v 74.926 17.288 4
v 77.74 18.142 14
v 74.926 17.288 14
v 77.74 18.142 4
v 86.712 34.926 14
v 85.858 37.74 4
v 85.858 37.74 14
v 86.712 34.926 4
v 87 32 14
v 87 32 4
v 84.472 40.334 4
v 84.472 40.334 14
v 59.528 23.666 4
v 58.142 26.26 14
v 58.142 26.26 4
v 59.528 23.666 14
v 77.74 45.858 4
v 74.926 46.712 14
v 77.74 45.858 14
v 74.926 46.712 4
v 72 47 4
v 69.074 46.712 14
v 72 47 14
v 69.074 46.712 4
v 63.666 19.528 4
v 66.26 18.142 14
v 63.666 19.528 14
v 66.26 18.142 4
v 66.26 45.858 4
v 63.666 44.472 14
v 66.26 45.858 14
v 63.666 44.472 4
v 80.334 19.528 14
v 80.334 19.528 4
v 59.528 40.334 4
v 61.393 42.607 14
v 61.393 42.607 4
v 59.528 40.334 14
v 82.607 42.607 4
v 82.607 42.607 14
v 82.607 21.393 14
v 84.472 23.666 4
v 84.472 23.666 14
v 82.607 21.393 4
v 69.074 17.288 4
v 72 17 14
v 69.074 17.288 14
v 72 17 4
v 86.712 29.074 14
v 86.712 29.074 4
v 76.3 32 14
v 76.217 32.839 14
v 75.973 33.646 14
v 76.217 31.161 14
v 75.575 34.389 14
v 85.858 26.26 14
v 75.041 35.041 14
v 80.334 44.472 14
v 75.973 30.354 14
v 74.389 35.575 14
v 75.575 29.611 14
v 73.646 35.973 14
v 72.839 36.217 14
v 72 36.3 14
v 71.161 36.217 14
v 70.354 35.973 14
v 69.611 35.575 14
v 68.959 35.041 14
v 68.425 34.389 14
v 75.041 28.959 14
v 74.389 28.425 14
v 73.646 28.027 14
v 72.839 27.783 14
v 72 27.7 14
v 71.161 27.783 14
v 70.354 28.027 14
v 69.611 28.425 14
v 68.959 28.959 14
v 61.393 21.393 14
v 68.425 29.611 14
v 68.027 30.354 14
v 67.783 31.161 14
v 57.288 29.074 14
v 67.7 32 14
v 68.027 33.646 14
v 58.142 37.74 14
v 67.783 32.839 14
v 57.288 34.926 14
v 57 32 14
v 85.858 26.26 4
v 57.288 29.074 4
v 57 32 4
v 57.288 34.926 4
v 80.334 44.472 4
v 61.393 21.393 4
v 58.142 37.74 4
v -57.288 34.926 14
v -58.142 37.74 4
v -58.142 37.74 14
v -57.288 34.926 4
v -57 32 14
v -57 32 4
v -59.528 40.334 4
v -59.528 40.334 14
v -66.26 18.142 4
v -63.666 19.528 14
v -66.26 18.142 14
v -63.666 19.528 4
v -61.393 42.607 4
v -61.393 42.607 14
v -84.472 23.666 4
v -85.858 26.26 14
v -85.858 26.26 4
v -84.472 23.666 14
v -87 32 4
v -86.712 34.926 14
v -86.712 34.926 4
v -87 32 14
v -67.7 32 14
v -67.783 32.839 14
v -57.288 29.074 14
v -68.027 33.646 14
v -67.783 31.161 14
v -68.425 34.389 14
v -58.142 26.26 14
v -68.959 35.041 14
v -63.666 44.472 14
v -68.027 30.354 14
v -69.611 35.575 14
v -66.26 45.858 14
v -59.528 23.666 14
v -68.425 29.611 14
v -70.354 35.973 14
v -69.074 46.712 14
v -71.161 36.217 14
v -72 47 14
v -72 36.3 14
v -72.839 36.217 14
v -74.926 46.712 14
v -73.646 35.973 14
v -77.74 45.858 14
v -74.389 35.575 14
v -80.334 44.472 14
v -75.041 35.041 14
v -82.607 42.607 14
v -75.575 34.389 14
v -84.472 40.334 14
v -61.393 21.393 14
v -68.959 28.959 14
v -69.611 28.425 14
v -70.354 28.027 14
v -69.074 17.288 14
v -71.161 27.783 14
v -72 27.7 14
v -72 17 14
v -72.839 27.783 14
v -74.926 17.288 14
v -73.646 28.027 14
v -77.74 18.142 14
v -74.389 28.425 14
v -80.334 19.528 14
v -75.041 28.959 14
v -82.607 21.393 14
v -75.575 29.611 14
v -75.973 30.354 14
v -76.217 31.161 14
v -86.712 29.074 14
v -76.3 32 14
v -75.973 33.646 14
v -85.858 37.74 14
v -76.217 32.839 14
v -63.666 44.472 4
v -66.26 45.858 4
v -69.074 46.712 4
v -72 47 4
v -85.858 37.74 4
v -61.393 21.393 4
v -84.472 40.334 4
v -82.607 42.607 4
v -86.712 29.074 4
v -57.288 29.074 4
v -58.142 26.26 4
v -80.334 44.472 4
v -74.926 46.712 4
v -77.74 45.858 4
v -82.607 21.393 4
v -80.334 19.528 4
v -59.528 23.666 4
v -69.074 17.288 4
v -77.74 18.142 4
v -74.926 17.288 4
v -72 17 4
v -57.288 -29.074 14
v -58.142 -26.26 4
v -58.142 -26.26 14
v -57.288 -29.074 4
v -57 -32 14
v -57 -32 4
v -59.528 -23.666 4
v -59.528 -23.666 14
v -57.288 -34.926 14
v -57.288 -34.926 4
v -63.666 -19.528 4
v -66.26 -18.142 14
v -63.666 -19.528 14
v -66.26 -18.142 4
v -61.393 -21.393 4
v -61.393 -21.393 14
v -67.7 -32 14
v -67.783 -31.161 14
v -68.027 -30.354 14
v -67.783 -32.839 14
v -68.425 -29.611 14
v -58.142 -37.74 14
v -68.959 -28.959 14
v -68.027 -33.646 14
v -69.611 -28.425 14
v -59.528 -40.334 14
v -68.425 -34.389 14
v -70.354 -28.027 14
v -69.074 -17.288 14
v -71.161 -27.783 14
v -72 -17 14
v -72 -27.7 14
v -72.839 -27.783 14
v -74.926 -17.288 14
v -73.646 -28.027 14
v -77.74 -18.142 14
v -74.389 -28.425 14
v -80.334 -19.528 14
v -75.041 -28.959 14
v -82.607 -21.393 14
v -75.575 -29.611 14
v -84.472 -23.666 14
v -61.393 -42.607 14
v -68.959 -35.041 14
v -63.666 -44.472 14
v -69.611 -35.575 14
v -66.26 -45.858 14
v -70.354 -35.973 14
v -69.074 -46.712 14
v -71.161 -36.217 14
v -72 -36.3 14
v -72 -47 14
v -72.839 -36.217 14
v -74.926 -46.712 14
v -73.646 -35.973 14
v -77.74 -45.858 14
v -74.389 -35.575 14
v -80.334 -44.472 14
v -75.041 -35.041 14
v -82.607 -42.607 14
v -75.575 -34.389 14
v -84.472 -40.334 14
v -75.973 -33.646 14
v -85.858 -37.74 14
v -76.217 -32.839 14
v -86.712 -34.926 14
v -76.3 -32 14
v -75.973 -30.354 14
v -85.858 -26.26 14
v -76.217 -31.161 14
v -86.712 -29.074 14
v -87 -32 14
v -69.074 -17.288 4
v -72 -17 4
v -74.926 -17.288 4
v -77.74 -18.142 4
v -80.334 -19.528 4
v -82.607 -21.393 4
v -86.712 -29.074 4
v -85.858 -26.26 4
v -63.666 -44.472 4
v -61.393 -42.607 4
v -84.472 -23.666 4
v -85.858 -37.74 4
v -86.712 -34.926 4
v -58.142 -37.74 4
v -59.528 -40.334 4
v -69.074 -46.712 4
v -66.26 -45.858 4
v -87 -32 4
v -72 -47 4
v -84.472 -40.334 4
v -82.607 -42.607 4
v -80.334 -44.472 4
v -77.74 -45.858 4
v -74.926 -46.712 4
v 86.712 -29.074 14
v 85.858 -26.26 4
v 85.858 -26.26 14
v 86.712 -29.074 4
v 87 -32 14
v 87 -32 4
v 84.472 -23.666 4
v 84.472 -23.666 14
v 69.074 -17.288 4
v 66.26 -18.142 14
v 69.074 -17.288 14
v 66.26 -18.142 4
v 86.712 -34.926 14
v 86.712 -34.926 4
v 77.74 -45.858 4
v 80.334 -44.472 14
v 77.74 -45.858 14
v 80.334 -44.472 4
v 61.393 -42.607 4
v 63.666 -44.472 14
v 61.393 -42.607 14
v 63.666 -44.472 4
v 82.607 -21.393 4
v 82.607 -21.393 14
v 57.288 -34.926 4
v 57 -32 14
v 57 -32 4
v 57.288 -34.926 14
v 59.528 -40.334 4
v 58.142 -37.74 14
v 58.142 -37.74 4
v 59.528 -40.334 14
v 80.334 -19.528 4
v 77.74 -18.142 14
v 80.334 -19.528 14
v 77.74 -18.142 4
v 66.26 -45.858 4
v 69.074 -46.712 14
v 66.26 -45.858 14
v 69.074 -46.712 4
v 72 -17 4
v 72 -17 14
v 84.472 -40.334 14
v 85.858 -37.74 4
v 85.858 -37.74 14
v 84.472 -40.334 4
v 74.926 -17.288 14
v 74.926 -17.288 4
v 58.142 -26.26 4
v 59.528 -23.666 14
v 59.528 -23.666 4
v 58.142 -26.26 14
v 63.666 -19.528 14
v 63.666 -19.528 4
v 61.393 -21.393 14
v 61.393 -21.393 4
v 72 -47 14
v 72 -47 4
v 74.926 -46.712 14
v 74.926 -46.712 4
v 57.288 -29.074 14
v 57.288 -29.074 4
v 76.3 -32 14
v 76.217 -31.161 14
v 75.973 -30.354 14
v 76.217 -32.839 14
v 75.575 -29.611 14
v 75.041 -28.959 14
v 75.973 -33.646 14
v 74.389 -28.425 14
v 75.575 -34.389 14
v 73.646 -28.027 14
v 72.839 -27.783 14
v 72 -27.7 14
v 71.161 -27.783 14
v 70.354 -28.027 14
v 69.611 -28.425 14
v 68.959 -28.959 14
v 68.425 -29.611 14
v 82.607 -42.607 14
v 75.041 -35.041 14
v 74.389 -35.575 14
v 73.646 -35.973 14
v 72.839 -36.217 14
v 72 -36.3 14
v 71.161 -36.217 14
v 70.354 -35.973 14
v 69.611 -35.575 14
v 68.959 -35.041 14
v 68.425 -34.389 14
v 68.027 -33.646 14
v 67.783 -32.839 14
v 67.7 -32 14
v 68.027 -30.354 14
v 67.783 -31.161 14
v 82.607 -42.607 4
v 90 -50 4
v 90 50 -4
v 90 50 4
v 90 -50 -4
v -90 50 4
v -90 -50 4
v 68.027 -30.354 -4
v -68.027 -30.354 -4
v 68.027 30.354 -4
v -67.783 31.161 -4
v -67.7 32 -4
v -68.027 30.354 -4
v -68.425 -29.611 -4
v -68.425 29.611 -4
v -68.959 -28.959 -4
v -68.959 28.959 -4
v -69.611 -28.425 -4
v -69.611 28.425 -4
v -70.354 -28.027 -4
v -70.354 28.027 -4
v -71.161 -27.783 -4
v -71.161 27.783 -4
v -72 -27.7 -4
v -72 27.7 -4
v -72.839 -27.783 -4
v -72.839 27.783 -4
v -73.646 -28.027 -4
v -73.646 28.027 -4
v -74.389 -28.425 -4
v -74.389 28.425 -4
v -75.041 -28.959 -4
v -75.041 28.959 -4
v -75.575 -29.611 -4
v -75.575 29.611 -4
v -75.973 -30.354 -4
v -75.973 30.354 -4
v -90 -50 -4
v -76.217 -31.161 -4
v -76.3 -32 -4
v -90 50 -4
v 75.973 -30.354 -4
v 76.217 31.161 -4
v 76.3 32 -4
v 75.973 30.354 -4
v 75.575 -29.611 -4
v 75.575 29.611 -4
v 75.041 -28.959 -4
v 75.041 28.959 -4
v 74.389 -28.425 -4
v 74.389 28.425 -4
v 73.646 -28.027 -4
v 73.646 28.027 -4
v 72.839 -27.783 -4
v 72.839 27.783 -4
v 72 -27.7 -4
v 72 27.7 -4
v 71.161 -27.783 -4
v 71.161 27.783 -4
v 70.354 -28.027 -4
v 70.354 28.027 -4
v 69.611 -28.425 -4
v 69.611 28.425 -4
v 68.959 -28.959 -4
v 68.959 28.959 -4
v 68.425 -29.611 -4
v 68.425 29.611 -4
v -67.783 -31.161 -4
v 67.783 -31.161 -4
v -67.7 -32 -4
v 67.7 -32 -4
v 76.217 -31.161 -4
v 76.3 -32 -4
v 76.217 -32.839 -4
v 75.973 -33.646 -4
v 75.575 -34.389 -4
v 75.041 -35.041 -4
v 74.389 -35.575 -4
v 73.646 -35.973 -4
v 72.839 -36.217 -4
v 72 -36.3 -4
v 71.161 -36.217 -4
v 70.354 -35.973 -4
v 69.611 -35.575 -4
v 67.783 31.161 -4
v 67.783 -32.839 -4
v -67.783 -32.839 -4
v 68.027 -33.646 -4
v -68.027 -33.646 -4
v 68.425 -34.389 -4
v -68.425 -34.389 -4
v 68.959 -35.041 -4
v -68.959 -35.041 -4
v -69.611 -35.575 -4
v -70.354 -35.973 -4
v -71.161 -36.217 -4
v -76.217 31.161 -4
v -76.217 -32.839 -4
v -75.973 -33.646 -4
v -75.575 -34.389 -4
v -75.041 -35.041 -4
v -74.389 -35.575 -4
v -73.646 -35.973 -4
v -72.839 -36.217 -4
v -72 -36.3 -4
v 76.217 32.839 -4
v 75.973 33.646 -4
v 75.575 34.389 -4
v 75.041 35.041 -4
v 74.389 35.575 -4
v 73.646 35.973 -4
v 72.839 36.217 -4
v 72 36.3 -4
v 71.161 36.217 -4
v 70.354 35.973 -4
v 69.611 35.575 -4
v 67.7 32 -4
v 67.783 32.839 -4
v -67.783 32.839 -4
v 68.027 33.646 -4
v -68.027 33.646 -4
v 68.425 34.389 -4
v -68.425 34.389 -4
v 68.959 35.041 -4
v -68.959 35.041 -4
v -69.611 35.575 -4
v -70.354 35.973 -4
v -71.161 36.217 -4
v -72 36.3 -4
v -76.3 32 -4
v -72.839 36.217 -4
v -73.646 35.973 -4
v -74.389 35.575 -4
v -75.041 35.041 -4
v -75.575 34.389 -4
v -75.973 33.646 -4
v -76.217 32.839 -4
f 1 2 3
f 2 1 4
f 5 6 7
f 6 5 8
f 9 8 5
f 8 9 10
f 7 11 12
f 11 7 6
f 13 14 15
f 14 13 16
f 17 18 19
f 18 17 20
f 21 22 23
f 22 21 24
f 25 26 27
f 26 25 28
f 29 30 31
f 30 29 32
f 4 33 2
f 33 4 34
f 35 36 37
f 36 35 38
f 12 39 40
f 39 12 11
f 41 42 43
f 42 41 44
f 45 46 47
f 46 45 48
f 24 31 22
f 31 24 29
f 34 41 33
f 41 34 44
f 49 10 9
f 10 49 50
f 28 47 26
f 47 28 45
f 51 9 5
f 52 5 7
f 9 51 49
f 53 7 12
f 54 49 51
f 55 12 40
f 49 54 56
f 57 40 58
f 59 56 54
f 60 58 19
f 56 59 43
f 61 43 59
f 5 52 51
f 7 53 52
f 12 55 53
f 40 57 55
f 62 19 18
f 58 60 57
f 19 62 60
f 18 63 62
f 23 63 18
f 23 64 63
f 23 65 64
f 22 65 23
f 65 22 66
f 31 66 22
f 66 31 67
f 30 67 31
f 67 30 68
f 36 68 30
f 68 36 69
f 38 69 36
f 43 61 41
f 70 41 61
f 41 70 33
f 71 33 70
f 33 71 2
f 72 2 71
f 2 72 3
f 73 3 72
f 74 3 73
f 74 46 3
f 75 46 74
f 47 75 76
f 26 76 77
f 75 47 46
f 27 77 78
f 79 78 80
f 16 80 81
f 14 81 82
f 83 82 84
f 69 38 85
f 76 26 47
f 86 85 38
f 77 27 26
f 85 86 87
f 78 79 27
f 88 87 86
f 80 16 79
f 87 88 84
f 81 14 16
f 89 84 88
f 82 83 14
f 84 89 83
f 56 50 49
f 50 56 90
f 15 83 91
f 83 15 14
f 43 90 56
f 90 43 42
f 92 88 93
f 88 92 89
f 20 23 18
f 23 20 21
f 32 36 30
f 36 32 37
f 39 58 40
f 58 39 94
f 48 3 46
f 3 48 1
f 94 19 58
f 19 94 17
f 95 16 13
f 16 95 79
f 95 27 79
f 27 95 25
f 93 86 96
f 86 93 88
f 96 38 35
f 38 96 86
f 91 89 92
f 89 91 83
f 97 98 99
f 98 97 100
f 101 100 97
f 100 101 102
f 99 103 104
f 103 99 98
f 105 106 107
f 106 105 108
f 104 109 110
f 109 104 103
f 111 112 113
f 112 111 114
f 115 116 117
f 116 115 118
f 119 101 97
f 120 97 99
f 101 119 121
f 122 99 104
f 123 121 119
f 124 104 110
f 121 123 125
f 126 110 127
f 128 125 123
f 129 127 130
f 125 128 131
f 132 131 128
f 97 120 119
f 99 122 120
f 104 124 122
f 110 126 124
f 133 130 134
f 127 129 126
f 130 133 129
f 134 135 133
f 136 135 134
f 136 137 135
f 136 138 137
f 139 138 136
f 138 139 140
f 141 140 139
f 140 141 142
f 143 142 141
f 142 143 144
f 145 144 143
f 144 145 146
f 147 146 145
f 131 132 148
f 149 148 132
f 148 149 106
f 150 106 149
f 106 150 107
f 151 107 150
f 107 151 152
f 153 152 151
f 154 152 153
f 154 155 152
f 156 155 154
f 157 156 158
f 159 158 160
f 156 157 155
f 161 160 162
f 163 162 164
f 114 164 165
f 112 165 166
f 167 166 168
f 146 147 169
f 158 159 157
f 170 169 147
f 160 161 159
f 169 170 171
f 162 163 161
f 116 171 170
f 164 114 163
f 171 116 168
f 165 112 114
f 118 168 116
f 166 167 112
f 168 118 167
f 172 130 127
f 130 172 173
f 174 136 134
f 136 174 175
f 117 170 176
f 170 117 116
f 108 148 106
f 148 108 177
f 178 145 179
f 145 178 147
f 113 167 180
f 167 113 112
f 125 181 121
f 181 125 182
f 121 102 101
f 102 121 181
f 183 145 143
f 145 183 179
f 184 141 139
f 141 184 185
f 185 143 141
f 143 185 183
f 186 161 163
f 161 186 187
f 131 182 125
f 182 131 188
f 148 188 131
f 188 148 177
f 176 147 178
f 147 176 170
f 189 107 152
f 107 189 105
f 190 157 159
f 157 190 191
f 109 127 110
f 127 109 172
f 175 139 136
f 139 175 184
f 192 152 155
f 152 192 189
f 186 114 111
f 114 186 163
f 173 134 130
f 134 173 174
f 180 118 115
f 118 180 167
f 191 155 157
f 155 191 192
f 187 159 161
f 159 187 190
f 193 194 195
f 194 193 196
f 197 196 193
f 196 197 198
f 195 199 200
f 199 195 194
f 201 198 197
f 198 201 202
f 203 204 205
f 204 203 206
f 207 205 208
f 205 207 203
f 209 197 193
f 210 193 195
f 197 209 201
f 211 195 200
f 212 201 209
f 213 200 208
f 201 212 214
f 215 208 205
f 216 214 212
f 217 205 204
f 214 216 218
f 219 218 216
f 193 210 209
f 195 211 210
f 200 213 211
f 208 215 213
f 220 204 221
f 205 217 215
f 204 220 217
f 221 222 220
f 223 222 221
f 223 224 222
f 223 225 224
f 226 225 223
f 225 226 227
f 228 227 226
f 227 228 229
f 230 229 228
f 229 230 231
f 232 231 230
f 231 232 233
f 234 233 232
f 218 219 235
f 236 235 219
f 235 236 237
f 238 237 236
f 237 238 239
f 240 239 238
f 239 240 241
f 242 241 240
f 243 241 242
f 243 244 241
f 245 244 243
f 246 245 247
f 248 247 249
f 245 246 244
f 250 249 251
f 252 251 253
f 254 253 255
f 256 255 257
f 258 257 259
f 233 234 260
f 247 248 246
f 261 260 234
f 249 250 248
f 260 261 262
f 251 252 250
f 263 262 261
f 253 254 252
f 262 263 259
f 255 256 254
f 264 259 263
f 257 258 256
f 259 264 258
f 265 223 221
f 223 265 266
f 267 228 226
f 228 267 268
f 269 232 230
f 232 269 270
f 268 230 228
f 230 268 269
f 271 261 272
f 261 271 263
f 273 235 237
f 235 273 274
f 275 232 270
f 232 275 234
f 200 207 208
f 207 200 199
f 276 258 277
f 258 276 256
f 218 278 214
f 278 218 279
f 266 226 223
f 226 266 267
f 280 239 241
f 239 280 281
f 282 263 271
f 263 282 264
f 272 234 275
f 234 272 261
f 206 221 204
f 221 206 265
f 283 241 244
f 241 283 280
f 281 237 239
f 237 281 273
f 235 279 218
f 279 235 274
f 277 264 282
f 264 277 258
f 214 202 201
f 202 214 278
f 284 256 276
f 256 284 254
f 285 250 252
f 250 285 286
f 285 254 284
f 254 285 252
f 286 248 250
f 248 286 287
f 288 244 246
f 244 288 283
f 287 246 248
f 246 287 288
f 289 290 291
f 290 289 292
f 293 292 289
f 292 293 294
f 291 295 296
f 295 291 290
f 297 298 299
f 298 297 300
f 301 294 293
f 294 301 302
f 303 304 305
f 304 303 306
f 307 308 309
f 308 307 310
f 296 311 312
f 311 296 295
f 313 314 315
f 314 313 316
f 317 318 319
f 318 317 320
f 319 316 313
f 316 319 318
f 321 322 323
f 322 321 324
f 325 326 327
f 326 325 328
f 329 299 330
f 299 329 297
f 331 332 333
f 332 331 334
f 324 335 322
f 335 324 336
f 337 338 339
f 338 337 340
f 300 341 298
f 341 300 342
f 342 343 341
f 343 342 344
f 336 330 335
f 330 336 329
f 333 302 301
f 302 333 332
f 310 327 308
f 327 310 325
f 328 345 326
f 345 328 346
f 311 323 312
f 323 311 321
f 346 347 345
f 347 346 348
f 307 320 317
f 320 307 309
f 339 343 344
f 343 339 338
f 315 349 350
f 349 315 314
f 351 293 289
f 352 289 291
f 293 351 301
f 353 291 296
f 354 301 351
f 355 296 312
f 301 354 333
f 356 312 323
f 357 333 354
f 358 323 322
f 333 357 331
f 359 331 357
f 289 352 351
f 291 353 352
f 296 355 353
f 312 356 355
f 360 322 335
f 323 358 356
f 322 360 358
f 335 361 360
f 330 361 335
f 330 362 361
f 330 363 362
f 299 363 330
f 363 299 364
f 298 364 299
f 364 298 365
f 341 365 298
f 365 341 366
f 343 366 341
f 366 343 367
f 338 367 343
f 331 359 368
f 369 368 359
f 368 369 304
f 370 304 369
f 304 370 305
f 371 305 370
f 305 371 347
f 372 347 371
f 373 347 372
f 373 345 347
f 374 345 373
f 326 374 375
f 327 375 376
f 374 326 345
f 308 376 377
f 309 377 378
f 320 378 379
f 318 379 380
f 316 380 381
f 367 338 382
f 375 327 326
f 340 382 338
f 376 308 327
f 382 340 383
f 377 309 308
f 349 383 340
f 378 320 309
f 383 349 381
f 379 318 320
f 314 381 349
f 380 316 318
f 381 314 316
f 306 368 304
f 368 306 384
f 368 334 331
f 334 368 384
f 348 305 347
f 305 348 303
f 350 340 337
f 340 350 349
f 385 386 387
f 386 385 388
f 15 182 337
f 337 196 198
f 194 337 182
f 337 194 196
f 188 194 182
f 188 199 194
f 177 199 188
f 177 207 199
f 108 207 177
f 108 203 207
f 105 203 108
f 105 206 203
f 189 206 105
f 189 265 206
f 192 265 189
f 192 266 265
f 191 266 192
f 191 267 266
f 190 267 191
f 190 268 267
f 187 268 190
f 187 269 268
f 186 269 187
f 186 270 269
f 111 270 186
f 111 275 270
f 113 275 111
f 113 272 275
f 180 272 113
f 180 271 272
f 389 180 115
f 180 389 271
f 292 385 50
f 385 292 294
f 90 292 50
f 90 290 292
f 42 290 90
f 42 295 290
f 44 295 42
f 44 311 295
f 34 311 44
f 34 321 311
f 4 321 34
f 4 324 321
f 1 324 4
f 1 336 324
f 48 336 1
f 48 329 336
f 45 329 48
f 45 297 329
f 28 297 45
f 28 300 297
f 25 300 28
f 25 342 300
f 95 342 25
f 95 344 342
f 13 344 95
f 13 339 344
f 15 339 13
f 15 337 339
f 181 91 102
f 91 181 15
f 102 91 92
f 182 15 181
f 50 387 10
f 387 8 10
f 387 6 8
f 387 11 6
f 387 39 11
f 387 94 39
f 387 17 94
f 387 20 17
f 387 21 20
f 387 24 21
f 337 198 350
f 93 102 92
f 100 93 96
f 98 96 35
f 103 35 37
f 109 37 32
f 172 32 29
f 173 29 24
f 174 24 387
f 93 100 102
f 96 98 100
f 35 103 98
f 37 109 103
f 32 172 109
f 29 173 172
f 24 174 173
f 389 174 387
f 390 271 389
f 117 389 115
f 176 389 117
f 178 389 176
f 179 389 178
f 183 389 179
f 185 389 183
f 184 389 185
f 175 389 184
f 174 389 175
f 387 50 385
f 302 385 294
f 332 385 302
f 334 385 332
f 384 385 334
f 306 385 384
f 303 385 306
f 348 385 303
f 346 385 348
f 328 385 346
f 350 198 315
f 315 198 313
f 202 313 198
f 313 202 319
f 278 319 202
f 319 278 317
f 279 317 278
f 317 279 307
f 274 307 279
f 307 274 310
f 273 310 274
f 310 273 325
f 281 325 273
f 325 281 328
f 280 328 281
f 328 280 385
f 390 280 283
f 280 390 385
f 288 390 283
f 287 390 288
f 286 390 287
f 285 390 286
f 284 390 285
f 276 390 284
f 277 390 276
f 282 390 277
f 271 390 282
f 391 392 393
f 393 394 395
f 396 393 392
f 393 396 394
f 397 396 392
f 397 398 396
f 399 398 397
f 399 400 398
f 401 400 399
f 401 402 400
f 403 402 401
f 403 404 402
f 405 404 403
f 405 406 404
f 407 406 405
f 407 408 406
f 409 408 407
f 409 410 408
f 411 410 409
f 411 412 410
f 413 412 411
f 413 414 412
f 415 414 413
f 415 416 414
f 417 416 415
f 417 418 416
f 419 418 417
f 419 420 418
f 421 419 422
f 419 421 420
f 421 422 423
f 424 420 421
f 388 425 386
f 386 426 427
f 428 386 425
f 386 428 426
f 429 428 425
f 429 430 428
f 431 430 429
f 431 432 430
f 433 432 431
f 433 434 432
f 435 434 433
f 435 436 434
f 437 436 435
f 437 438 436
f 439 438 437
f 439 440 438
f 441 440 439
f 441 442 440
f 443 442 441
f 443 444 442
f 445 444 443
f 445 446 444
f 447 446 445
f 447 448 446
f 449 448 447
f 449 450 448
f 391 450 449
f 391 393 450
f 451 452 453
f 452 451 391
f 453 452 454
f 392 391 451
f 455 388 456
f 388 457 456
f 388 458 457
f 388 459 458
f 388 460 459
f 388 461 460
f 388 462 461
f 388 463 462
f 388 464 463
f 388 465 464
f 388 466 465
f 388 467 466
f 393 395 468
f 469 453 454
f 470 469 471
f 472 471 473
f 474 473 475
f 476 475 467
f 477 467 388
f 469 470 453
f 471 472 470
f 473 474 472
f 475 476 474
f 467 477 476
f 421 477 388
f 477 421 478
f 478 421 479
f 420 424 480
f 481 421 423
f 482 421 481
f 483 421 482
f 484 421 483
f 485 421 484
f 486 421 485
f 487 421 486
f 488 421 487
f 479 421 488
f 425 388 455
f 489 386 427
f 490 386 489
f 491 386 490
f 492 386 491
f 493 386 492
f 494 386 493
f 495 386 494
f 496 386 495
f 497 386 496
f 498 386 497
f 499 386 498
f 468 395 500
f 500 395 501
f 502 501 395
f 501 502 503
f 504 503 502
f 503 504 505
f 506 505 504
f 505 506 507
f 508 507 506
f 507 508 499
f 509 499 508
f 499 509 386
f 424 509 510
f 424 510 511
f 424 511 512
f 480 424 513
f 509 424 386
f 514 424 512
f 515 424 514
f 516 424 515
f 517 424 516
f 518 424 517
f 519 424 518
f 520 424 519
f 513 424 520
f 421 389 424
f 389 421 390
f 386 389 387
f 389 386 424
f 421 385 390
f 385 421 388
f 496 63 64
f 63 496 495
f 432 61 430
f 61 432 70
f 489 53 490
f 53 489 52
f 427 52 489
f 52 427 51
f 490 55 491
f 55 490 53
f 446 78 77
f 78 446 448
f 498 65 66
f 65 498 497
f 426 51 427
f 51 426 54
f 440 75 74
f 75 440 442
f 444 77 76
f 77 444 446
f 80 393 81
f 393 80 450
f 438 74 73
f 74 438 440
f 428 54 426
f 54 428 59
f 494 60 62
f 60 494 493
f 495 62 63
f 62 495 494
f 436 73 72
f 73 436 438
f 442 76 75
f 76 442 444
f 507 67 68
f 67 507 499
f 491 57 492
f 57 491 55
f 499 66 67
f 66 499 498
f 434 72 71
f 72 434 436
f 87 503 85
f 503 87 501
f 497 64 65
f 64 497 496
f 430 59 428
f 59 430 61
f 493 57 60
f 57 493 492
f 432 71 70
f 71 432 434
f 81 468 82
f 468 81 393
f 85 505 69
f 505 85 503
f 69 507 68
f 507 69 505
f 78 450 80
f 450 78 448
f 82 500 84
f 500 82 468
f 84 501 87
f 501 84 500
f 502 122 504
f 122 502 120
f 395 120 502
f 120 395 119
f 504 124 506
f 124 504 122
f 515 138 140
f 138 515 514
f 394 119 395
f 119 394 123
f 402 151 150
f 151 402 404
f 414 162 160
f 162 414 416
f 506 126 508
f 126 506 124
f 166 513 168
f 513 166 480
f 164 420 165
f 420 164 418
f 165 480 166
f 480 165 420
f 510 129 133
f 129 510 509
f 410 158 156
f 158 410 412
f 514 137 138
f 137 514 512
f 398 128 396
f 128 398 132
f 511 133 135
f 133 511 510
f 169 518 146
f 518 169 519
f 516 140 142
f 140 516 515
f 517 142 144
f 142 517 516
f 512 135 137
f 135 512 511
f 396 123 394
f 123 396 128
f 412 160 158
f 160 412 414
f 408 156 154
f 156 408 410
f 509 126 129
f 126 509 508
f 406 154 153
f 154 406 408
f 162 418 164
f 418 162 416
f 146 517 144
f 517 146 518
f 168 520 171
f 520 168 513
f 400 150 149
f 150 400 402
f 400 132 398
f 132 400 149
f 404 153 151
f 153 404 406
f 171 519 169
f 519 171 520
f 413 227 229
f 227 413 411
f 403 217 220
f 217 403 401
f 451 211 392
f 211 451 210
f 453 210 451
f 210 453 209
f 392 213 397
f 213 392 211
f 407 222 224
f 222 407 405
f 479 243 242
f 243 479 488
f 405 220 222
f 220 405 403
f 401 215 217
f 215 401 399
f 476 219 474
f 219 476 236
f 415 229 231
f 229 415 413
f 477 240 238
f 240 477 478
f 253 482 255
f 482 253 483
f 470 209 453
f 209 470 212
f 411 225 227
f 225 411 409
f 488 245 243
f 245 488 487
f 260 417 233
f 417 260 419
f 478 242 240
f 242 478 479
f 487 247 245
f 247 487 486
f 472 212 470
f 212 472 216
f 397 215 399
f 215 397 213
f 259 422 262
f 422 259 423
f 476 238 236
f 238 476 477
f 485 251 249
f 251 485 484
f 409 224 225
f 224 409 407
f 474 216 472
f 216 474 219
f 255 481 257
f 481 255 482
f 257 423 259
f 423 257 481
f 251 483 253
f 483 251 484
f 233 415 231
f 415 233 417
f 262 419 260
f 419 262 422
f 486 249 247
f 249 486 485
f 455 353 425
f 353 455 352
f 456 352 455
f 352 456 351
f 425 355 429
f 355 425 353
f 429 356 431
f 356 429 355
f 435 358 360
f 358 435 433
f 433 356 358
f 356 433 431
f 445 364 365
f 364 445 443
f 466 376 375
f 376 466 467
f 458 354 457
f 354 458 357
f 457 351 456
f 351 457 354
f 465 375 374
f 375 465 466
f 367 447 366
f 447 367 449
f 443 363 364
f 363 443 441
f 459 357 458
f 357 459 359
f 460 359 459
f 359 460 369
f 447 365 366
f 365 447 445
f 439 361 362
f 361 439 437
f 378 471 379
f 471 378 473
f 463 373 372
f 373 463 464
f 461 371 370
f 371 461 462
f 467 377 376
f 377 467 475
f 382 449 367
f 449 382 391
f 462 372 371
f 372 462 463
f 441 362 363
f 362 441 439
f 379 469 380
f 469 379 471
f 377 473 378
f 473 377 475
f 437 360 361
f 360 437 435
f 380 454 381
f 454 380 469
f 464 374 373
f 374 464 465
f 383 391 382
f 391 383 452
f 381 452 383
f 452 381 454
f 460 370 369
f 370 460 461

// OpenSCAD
$fn = 32;

// ----------------------------------------------------------------------
// Anchor pads 180 x 100 x 18
// four corner bosses with anchor holes
// ----------------------------------------------------------------------

// --- parameters (mm) ---
plate = [180, 100, 8];  // base plate size (x, y, z)
pads = 4;               // boss count, one per corner
edge = 18;              // boss centre offset from the plate edge
boss_d = 30;            // boss diameter
boss_h = 10;            // boss height above the base plate
bore_d = 8.4;           // nominal hole diameter from the drawing
print_allowance = 0.2;  // clearance added for printing

// --- derived feature positions (mm) ---
hole_d = bore_d + print_allowance;  // = 8.6   hole diameter as printed
height = plate[2] + boss_h;         // = 18   overall height of the part
corner_x = plate[0] / 2 - edge;     // = 72   boss centre X
corner_y = plate[1] / 2 - edge;     // = 32   boss centre Y
feature_centers = [
  [corner_x, corner_y],
  [-corner_x, corner_y],
  [-corner_x, -corner_y],
  [corner_x, -corner_y]
];   // boss centres, anchor holes are drilled there

// base plate, four bosses standing on it, anchor holes all the way through
difference() {
  union() {
    cube(plate, center = true);
    for (centre = feature_centers)
      translate([centre[0], centre[1], plate[2] / 2 - 1])
        cylinder(d = boss_d, h = boss_h + 1);
  }
  for (centre = feature_centers)
    translate([centre[0], centre[1], -height])
      cylinder(d = hole_d, h = 2 * height + 2);  // through boss and plate
}
